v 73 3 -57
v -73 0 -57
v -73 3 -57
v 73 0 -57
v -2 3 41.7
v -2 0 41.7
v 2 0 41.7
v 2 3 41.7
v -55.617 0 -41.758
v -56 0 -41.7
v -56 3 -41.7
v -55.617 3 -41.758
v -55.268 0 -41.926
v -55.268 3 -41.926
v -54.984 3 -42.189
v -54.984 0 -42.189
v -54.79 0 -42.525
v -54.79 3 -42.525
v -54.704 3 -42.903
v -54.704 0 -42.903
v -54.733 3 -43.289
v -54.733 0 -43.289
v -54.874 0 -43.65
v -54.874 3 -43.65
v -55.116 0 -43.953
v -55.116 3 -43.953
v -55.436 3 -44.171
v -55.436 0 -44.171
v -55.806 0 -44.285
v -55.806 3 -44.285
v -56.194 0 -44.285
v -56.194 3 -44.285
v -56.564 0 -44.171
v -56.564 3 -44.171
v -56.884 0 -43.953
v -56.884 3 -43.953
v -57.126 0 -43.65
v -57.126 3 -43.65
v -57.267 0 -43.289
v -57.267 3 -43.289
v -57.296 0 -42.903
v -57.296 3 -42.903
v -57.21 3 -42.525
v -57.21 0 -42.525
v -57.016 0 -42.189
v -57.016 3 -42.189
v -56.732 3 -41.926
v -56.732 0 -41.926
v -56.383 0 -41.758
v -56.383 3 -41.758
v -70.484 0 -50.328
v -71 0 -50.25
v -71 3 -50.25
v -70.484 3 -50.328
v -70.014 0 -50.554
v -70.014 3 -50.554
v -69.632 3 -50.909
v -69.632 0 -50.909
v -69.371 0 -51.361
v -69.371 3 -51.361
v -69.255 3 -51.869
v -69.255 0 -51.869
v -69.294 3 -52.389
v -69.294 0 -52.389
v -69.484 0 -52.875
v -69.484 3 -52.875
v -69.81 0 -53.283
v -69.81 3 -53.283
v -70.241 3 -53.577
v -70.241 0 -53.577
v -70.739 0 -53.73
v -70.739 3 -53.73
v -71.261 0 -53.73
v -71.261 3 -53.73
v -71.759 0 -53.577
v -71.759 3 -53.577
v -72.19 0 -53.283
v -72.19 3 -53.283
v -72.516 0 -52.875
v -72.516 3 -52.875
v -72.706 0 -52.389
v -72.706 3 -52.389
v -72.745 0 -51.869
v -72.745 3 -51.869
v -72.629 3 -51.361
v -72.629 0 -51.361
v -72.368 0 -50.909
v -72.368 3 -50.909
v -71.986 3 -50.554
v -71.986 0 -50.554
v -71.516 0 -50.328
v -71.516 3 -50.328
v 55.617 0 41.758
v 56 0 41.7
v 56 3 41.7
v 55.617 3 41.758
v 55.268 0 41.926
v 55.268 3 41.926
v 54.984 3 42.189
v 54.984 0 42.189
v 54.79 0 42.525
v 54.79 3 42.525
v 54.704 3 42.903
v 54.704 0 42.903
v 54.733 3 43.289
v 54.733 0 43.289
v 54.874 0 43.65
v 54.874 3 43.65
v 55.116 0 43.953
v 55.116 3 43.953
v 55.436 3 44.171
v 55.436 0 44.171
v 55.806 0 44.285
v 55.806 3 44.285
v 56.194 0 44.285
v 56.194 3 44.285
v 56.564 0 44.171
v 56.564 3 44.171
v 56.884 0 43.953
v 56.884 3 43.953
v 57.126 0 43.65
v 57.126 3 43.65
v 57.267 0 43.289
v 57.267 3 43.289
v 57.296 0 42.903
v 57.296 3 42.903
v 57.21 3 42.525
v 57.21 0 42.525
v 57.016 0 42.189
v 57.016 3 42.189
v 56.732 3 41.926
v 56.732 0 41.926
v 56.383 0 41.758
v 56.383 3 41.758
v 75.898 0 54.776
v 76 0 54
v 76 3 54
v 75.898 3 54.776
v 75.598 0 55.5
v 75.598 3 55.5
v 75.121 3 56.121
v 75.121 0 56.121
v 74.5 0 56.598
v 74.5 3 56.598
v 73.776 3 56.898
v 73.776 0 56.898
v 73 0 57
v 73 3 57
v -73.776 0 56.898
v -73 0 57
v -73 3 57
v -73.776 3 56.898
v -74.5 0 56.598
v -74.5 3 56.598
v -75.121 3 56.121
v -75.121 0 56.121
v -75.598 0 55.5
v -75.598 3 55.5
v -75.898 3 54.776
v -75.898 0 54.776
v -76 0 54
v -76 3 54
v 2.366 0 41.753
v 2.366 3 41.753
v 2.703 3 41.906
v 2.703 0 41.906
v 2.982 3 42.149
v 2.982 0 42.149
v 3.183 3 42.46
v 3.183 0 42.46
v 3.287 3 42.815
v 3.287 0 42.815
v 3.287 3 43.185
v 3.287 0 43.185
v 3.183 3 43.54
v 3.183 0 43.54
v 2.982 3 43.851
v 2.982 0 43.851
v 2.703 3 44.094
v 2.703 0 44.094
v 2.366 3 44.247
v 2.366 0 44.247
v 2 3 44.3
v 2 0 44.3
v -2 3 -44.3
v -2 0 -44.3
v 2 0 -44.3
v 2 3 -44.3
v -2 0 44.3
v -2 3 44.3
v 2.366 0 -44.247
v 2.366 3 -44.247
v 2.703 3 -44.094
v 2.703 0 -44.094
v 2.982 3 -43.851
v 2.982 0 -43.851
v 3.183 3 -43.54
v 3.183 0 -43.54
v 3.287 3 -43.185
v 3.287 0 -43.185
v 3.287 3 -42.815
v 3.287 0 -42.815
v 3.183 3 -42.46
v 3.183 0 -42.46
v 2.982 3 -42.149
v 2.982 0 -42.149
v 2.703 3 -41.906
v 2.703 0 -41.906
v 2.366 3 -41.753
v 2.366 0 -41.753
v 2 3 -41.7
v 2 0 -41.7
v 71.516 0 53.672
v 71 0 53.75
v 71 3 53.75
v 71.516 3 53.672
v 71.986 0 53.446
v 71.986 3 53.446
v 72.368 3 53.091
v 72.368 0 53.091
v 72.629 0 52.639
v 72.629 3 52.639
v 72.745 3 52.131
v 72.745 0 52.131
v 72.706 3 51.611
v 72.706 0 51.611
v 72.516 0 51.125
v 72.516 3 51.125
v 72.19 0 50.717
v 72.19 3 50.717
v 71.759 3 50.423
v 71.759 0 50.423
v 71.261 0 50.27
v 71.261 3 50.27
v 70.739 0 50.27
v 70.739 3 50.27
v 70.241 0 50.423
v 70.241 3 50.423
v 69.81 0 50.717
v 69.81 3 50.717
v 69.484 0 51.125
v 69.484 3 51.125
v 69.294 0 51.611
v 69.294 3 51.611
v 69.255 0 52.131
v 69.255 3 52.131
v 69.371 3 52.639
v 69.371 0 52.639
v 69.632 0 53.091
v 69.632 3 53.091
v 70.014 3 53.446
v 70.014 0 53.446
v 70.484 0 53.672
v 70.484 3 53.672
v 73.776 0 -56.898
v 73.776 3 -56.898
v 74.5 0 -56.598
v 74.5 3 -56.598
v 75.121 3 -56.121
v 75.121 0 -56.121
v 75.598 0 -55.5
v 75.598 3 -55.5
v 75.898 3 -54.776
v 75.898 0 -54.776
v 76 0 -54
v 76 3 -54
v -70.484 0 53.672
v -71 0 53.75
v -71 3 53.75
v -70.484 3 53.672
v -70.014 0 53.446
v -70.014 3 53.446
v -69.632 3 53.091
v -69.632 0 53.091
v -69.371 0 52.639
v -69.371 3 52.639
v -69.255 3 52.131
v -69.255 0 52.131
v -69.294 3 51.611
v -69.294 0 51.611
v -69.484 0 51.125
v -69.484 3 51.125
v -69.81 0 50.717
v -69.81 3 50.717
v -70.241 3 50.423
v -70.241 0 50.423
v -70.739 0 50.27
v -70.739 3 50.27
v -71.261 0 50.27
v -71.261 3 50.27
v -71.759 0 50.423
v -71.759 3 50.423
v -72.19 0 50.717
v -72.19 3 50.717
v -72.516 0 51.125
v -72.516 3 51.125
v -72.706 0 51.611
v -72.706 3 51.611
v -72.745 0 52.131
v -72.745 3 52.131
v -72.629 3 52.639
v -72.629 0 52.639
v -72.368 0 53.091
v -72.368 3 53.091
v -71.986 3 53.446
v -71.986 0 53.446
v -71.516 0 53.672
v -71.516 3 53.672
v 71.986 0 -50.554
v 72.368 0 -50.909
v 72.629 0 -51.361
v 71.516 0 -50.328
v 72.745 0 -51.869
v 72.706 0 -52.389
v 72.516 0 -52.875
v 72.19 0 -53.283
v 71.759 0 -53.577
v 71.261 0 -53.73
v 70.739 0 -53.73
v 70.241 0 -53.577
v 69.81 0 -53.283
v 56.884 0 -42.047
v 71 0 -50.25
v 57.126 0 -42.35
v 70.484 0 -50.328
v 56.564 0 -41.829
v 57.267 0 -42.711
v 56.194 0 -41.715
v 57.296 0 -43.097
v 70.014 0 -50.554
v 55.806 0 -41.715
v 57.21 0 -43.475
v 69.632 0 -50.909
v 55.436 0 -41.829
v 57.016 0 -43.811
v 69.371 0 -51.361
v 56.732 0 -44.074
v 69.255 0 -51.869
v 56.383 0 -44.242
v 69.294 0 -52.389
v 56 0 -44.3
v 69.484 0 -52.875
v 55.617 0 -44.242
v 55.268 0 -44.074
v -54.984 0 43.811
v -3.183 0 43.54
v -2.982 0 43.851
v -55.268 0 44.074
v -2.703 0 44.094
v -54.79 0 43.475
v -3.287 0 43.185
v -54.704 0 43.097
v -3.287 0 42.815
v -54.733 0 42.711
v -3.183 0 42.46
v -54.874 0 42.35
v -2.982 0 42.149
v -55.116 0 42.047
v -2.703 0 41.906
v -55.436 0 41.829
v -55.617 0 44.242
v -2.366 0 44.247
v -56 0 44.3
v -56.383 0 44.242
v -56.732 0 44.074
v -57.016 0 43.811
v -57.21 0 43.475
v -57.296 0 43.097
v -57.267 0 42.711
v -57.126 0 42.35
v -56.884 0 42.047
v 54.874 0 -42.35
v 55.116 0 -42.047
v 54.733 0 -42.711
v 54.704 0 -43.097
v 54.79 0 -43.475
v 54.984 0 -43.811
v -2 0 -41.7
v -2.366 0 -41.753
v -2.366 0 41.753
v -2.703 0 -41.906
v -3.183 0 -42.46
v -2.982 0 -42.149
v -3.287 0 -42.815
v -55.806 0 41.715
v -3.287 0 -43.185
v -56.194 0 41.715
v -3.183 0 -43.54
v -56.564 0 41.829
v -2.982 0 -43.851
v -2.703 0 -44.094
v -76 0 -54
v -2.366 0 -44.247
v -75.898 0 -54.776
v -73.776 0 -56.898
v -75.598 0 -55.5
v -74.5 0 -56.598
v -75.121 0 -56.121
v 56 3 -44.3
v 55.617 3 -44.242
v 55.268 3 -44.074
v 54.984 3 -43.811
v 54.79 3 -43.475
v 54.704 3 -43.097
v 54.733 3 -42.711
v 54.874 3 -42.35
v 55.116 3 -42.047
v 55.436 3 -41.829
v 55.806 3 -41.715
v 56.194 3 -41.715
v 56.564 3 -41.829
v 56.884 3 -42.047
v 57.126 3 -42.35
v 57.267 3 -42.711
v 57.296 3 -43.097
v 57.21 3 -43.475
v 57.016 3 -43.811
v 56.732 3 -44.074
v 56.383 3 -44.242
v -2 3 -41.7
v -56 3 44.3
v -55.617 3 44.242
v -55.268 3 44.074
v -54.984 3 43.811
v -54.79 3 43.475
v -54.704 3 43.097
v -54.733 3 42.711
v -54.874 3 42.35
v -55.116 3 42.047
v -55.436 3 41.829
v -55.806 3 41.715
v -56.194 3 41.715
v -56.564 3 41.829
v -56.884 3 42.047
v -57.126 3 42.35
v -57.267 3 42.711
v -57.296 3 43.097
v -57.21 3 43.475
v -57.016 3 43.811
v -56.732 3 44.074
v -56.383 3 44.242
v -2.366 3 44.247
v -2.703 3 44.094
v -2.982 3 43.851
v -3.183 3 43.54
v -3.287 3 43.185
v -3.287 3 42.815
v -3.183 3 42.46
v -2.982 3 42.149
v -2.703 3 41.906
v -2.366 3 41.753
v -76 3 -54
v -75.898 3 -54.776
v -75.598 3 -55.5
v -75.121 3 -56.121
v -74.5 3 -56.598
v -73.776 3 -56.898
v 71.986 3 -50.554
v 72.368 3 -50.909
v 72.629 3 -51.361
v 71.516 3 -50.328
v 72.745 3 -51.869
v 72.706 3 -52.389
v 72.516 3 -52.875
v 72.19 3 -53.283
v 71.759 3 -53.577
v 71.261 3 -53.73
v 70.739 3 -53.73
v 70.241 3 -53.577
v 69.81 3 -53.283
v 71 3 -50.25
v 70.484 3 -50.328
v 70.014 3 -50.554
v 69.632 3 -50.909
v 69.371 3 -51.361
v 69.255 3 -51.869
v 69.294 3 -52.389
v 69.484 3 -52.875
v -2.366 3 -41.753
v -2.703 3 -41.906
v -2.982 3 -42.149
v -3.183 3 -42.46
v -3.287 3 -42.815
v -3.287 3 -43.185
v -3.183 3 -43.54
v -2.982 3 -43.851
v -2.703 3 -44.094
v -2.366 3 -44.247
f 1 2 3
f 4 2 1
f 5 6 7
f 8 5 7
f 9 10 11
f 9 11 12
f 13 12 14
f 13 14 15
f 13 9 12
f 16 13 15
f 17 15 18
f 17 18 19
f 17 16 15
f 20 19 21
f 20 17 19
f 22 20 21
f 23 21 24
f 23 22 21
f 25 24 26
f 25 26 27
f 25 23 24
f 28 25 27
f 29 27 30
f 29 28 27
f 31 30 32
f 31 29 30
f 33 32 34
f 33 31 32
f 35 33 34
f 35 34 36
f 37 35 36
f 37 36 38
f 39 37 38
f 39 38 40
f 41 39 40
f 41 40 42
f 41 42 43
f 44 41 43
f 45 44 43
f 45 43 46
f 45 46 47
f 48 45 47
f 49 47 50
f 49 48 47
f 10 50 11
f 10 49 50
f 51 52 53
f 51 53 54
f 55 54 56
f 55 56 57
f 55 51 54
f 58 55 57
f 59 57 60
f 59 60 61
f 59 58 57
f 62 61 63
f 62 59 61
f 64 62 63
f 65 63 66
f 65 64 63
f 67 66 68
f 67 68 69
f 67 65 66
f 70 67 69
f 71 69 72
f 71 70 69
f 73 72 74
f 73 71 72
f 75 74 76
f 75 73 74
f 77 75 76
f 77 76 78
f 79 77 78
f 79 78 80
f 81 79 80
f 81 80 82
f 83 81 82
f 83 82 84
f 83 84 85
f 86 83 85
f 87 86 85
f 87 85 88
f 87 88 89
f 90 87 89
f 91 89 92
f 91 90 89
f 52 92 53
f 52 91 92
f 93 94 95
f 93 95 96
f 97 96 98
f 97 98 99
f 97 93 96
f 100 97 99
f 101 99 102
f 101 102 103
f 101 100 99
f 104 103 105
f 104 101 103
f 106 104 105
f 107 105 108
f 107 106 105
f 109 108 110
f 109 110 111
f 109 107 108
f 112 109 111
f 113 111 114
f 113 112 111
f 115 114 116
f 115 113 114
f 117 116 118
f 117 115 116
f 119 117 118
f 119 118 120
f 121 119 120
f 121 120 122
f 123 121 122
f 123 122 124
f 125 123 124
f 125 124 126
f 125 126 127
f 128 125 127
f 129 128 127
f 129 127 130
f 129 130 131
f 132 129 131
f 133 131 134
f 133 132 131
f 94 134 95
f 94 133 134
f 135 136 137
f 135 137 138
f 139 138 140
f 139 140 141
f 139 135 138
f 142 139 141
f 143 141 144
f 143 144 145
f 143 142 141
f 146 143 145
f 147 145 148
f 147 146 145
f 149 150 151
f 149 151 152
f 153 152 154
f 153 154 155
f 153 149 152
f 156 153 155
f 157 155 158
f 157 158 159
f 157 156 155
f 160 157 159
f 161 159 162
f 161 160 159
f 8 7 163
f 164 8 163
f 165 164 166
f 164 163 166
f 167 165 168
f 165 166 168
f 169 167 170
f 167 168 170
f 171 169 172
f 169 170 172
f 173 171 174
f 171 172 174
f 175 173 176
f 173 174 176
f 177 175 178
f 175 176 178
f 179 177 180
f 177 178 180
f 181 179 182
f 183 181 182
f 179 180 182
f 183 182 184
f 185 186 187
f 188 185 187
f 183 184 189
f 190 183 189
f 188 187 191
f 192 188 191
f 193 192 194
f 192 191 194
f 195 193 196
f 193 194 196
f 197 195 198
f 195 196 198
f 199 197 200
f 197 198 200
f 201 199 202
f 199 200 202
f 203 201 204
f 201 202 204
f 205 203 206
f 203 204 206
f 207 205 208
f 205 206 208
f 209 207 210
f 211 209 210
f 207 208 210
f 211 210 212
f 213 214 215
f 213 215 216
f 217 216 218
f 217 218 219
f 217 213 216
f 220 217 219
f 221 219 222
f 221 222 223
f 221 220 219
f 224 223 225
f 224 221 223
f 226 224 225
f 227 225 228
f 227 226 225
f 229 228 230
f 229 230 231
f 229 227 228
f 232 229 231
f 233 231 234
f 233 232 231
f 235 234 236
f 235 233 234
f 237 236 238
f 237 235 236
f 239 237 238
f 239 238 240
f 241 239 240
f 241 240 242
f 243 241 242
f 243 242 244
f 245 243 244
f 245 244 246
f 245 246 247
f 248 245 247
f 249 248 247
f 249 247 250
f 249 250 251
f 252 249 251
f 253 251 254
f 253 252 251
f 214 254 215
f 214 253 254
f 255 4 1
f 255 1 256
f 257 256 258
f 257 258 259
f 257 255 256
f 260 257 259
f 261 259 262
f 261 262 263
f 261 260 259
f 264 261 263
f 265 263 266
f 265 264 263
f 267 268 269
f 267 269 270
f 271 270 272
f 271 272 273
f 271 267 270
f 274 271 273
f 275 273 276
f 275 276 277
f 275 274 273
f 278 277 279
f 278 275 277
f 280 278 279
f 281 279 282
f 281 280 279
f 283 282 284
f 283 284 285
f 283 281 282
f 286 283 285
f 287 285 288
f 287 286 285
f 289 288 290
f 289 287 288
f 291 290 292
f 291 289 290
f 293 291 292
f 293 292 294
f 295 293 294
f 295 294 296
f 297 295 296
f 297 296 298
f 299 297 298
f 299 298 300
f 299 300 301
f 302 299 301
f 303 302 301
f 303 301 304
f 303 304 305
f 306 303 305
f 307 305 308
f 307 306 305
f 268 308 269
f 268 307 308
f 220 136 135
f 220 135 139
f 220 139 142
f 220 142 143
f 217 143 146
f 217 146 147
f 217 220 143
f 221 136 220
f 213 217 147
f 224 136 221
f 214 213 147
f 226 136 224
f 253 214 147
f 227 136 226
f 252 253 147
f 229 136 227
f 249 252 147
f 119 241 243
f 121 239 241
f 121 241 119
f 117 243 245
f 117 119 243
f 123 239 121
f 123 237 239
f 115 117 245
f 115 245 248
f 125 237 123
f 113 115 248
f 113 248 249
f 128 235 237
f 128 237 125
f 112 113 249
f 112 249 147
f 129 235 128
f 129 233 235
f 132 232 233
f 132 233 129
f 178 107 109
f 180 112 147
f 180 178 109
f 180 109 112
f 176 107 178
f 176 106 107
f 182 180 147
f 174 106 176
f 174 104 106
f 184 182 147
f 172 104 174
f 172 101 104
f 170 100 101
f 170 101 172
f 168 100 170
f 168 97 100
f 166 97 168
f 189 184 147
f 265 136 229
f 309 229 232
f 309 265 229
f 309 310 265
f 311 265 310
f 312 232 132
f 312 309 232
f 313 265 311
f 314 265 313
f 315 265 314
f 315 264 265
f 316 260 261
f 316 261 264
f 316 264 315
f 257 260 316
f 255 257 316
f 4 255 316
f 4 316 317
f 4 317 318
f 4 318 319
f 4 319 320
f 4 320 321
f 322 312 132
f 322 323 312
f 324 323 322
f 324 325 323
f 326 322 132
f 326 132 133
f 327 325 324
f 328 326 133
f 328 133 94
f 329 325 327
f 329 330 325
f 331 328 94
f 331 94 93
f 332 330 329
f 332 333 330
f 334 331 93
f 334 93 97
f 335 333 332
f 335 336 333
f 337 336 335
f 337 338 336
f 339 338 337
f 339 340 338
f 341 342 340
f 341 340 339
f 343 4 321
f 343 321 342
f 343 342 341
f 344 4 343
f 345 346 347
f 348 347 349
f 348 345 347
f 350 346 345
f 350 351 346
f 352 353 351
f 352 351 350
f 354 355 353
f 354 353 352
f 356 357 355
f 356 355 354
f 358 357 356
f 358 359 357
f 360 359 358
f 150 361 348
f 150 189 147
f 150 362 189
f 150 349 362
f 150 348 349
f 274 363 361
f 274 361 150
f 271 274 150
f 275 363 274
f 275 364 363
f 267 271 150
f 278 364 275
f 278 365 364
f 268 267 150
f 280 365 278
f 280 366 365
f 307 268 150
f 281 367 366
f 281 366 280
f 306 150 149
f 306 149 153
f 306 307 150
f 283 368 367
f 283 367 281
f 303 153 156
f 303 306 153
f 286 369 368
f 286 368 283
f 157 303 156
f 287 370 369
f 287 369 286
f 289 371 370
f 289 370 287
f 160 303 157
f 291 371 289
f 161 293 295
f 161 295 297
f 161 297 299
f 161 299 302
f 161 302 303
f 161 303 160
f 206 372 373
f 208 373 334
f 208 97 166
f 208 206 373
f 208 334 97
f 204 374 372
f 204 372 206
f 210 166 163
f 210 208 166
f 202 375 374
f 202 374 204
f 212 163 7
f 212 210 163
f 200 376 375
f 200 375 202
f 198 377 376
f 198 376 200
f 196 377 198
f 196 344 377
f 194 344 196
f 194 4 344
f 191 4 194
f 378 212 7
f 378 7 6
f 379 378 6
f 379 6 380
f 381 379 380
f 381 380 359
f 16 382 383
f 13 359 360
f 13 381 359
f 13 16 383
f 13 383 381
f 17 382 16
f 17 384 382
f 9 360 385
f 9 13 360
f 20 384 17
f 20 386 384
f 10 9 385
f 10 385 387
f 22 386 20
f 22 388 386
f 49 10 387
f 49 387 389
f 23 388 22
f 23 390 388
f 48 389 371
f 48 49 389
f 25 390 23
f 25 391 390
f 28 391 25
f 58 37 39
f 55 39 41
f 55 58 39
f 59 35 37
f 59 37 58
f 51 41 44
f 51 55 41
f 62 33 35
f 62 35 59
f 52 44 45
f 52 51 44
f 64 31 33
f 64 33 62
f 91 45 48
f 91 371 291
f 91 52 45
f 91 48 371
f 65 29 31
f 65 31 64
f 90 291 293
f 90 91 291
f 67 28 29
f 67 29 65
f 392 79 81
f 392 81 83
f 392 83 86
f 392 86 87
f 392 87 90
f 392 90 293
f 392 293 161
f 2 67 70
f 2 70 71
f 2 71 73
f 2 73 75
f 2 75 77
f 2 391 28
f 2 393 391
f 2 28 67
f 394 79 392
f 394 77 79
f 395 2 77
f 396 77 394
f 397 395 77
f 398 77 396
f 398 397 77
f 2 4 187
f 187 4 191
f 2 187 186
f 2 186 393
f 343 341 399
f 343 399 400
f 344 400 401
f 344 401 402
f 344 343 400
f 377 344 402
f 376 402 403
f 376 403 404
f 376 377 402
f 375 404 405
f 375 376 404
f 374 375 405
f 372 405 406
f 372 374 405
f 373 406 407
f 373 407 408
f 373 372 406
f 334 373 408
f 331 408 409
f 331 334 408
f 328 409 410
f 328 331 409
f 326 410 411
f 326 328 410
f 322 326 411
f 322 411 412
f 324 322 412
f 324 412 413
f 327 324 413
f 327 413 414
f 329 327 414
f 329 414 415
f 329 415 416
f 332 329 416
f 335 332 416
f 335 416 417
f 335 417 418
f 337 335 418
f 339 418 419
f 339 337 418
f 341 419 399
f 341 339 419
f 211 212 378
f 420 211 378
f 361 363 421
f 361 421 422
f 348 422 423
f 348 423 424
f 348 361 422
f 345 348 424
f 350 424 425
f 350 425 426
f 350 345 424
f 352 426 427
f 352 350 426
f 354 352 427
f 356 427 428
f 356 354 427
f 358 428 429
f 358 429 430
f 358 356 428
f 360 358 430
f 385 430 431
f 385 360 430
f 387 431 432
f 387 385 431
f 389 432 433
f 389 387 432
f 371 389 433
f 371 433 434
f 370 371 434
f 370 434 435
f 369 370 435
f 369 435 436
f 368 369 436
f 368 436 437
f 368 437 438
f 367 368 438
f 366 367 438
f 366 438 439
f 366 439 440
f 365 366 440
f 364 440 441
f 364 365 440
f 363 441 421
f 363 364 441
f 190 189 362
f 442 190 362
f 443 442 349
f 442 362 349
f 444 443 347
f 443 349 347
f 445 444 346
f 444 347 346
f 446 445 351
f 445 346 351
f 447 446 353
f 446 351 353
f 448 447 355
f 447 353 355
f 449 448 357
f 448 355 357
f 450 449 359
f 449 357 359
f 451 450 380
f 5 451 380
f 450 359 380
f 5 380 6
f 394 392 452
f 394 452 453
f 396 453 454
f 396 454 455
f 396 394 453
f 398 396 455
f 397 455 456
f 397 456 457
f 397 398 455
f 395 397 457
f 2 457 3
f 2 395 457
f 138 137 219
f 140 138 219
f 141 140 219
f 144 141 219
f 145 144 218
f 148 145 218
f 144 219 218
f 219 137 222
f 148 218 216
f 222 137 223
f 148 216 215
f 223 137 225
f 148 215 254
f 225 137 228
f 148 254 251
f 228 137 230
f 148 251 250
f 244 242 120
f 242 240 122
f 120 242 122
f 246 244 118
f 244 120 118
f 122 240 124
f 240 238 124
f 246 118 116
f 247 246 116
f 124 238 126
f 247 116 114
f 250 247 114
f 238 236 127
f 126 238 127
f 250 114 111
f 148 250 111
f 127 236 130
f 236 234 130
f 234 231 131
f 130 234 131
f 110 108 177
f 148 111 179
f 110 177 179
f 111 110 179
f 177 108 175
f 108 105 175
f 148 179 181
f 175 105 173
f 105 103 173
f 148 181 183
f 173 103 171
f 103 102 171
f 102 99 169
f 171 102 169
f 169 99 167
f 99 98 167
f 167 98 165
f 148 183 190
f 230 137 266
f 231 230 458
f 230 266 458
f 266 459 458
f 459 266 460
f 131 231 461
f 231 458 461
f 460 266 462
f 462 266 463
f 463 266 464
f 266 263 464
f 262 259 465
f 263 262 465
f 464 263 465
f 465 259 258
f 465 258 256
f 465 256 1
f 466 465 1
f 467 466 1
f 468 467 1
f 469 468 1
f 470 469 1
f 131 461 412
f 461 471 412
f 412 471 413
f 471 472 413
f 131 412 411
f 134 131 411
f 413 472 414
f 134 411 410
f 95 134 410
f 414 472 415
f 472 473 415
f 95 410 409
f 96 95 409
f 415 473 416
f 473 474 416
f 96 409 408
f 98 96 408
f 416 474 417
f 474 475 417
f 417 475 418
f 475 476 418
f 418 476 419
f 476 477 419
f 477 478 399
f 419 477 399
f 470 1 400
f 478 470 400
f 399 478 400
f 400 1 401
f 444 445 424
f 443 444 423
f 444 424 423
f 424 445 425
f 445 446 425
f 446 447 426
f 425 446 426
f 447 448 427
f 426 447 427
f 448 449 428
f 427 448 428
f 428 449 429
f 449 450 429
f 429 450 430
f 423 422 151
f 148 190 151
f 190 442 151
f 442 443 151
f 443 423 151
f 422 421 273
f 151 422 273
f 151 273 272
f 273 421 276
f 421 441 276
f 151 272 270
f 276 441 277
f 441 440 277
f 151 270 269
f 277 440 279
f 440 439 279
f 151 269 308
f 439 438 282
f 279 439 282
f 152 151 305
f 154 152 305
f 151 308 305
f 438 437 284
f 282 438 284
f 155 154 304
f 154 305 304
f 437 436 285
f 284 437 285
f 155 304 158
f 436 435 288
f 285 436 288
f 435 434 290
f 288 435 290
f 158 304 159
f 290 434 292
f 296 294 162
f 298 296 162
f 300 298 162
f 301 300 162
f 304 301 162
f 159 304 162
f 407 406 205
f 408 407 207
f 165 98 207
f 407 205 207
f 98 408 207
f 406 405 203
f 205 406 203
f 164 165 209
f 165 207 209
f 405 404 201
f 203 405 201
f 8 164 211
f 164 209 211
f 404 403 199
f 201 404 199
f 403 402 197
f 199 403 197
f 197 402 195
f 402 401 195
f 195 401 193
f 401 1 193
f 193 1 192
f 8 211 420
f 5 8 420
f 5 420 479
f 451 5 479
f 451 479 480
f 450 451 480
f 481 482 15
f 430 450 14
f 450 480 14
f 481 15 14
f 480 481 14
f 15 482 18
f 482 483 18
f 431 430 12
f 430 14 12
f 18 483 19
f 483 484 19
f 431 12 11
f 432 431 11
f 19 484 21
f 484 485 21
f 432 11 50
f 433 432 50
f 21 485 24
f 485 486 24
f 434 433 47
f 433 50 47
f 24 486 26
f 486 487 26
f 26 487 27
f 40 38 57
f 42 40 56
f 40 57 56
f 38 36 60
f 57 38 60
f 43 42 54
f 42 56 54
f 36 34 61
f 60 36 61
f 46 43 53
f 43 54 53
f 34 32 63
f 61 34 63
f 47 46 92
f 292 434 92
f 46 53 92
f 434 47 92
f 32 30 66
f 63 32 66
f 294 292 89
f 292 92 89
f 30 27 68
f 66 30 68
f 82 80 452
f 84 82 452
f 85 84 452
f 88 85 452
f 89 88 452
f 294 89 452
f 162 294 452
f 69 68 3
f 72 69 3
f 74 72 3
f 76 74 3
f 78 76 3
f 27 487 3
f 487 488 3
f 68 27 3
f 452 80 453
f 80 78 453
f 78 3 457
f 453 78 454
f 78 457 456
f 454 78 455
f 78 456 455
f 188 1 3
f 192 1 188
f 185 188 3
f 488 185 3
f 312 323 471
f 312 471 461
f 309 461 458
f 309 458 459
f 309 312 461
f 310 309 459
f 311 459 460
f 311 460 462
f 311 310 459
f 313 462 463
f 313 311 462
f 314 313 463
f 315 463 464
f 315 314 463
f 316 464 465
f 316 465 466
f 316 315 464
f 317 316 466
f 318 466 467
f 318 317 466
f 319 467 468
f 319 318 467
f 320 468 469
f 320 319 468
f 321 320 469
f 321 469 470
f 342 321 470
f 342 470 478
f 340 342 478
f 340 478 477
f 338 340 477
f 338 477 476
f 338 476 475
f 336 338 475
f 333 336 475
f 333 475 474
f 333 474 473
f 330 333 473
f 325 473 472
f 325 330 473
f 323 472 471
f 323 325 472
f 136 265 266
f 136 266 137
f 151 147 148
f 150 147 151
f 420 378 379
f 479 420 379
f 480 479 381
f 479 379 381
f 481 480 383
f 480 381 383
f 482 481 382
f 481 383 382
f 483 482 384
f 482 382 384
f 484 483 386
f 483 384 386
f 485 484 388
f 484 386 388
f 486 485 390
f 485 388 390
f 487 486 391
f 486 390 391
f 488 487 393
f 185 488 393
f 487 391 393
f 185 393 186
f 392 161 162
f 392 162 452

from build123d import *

# Parameters (mm, degrees)
SKETCH_1_R      = 1.75
SKETCH_1_R_2    = 1.3
EXTRUDE_1_DEPTH = 3


with BuildPart() as part:
    # 草图1 → 凸台-拉伸1 (new body)
    with BuildSketch(Plane(origin=(0, 0, 0), x_dir=(1, 0, 0), z_dir=(0, 1, 0))):
        with BuildLine():
            Line((-73, 57), (73, 57))
            ThreePointArc((73, 57), (75.121320344, 56.121320344), (76, 54))
            Line((76, 54), (76, -54))
            ThreePointArc((76, -54), (75.121320344, -56.121320344), (73, -57))
            Line((73, -57), (-73, -57))
            ThreePointArc((-73, -57), (-75.121320344, -56.121320344), (-76, -54))
            Line((-76, -54), (-76, 54))
            ThreePointArc((-76, 54), (-75.121320344, 56.121320344), (-73, 57))
        make_face()
        with Locations((-71, 52)):
            Circle(SKETCH_1_R, mode=Mode.SUBTRACT)
        with Locations((71, 52)):
            Circle(SKETCH_1_R, mode=Mode.SUBTRACT)
        with Locations((71, -52)):
            Circle(SKETCH_1_R, mode=Mode.SUBTRACT)
        with Locations((-71, -52)):
            Circle(SKETCH_1_R, mode=Mode.SUBTRACT)
        with Locations((-56, 43)):
            Circle(SKETCH_1_R_2, mode=Mode.SUBTRACT)
        with Locations((-56, -43)):
            Circle(SKETCH_1_R_2, mode=Mode.SUBTRACT)
        with Locations((56, -43)):
            Circle(SKETCH_1_R_2, mode=Mode.SUBTRACT)
        with Locations((56, 43)):
            Circle(SKETCH_1_R_2, mode=Mode.SUBTRACT)
        with BuildLine():
            Line((-2, 44.3), (2, 44.3))
            ThreePointArc((2, 44.3), (3.3, 43), (2, 41.7))
            Line((2, 41.7), (-2, 41.7))
            ThreePointArc((-2, 41.7), (-3.3, 43), (-2, 44.3))
        make_face(mode=Mode.SUBTRACT)
        with BuildLine():
            Line((-2, -41.7), (2, -41.7))
            ThreePointArc((2, -41.7), (3.3, -43), (2, -44.3))
            Line((2, -44.3), (-2, -44.3))
            ThreePointArc((-2, -44.3), (-3.3, -43), (-2, -41.7))
        make_face(mode=Mode.SUBTRACT)
    extrude(amount=EXTRUDE_1_DEPTH)


solid = part.part
